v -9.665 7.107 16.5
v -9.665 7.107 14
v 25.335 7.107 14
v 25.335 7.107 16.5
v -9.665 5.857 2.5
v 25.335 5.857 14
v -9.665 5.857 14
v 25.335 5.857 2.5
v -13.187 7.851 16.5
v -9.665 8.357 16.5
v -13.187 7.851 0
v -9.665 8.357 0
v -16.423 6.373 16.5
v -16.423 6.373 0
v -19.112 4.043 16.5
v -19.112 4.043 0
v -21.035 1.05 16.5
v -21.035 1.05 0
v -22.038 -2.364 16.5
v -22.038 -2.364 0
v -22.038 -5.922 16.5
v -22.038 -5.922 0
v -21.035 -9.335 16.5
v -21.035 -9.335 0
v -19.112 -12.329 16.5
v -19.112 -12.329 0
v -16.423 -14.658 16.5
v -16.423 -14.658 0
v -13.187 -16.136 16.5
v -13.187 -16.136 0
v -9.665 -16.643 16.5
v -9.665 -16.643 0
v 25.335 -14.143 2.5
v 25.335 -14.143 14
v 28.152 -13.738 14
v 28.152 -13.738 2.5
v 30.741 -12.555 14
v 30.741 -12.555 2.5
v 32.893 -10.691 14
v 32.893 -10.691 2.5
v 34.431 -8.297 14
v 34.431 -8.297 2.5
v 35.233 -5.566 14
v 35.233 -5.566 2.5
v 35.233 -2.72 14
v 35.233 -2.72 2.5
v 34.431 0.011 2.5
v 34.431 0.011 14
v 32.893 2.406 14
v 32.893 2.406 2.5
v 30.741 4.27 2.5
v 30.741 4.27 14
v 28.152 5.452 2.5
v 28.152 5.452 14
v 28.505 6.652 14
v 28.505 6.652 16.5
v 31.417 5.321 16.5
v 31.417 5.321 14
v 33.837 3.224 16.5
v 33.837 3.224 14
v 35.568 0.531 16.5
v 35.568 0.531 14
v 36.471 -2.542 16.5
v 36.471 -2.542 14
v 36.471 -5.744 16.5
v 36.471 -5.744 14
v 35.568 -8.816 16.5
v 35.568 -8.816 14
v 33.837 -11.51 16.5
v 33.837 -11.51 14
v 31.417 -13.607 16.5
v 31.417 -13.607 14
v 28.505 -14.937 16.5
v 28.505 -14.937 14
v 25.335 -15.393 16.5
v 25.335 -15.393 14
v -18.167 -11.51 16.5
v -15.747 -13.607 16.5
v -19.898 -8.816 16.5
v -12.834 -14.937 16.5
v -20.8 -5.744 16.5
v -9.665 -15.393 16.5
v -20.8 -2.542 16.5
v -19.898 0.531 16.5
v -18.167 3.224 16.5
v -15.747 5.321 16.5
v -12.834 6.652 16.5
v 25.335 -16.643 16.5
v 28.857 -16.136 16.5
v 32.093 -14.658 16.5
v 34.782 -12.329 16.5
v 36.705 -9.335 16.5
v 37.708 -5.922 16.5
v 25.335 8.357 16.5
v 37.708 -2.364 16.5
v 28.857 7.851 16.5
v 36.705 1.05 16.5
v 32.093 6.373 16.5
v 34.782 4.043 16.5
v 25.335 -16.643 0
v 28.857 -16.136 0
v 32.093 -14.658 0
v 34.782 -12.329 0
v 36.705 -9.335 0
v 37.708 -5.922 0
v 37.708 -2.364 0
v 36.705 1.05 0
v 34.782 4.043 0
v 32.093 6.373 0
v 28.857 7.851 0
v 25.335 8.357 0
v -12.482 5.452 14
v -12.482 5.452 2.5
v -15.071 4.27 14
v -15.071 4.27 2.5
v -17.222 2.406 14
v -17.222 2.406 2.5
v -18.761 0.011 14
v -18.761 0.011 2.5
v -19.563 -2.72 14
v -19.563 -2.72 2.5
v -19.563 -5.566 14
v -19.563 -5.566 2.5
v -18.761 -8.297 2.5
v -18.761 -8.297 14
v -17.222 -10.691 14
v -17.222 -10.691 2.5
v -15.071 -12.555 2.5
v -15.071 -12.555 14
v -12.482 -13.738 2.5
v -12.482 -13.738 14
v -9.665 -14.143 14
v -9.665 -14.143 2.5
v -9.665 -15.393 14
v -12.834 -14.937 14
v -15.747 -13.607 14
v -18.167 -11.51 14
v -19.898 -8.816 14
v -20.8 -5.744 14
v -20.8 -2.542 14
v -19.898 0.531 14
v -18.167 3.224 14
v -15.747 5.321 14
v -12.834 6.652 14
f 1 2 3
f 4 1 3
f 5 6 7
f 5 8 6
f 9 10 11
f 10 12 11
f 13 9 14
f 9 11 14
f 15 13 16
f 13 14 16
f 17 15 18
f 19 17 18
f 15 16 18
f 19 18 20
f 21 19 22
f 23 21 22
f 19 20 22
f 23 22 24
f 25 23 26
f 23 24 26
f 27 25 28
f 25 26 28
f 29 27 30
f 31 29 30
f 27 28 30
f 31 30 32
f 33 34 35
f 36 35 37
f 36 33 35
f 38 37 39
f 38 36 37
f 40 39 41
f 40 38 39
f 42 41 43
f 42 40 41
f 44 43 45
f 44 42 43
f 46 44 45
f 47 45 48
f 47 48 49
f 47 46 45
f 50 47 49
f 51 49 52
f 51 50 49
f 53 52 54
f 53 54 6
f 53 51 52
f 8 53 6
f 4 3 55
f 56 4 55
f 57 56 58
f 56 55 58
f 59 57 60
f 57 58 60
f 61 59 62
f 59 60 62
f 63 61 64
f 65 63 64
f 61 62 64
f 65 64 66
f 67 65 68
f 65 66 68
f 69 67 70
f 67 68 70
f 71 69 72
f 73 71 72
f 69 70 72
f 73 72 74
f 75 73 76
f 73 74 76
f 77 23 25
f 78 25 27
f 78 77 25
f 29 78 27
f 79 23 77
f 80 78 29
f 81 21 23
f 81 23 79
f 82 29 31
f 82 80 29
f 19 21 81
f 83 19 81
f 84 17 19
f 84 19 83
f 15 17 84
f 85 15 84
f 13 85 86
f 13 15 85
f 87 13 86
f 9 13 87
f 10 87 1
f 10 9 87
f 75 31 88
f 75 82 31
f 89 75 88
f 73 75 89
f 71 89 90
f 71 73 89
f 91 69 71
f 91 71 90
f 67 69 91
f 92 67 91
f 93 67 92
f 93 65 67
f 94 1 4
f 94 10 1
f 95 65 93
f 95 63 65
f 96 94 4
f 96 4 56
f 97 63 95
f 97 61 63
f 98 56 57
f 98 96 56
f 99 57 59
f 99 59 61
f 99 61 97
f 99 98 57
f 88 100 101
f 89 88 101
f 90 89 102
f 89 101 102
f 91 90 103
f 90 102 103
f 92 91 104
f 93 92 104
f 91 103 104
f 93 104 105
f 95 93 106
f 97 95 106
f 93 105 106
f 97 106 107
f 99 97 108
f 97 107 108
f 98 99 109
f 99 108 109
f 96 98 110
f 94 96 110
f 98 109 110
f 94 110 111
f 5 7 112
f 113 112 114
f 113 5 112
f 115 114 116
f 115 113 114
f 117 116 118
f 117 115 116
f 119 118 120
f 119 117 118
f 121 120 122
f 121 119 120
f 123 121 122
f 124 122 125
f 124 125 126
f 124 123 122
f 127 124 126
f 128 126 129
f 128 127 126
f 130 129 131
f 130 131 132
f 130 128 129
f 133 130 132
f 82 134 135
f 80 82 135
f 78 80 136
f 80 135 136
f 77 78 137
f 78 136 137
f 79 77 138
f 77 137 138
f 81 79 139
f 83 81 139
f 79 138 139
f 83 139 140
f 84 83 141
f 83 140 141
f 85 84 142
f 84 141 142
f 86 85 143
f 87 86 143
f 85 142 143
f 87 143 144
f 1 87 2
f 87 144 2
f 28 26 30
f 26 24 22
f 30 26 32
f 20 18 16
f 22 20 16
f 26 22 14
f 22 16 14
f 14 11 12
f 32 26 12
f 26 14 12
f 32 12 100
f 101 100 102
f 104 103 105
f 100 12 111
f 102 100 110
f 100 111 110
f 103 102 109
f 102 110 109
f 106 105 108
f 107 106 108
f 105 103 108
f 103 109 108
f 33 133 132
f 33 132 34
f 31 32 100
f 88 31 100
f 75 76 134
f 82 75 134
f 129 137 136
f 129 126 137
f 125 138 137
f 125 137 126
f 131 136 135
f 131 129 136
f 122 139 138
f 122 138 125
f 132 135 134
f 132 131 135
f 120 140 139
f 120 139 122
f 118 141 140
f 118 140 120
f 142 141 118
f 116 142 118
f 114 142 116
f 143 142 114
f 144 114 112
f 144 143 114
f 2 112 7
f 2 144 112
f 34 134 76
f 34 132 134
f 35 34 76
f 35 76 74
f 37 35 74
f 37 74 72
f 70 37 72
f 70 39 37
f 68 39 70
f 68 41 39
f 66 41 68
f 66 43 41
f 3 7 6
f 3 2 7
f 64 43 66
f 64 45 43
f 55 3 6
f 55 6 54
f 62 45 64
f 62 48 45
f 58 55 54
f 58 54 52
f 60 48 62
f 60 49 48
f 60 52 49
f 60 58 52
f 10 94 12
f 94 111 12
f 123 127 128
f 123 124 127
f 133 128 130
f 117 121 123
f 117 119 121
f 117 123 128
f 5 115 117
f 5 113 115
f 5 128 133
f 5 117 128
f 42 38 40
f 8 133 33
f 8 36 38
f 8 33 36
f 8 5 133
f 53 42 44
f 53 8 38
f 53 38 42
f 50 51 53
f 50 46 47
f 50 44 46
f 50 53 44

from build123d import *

# Parameters (mm, degrees)
F1_DEPTH = 14
F2_T     = -2.5
F4_DEPTH = 2.5


with BuildPart() as f1:
    # F0 (on Top) → F1 (new body)
    with BuildSketch(Plane.XY):
        with BuildLine():
            ThreePointArc((-9.6649585424, 8.357251808), (-22.1649585424, -4.142748192), (-9.6649585424, -16.642748192))
            Line((-9.6649585424, -16.642748192), (25.3350414576, -16.642748192))
            ThreePointArc((25.3350414576, -16.642748192), (37.8350414576, -4.142748192), (25.3350414576, 8.357251808))
            Line((25.3350414576, 8.357251808), (-9.6649585424, 8.357251808))
        make_face()
    extrude(amount=F1_DEPTH)

    # F2
    f2_openings = [f1.faces().sort_by_distance(p)[0] for p in [
        (7.835041, -4.142748, 14),
    ]]
    offset(amount=F2_T, openings=f2_openings)

    # F3 (on face) → F4 (join)
    with BuildSketch(Plane.XY.offset(14)):
        with BuildLine():
            ThreePointArc((25.3350414576, -16.642748192), (37.8350414576, -4.142748192), (25.3350414576, 8.357251808))
            Line((25.3350414576, 8.357251808), (-9.6649585424, 8.357251808))
            ThreePointArc((-9.6649585424, 8.357251808), (-22.1649585424, -4.142748192), (-9.6649585424, -16.642748192))
            Line((-9.6649585424, -16.642748192), (25.3350414576, -16.642748192))
        make_face()
        with BuildLine():
            Line((-9.6649585424, 7.107251808), (25.3350414576, 7.107251808))
            ThreePointArc((25.3350414576, 7.107251808), (36.5850414576, -4.142748192), (25.3350414576, -15.392748192))
            Line((25.3350414576, -15.392748192), (-9.6649585424, -15.392748192))
            ThreePointArc((-9.6649585424, -15.392748192), (-20.9149585424, -4.142748192), (-9.6649585424, 7.107251808))
        make_face(mode=Mode.SUBTRACT)
    extrude(amount=F4_DEPTH)


solid = f1.part
